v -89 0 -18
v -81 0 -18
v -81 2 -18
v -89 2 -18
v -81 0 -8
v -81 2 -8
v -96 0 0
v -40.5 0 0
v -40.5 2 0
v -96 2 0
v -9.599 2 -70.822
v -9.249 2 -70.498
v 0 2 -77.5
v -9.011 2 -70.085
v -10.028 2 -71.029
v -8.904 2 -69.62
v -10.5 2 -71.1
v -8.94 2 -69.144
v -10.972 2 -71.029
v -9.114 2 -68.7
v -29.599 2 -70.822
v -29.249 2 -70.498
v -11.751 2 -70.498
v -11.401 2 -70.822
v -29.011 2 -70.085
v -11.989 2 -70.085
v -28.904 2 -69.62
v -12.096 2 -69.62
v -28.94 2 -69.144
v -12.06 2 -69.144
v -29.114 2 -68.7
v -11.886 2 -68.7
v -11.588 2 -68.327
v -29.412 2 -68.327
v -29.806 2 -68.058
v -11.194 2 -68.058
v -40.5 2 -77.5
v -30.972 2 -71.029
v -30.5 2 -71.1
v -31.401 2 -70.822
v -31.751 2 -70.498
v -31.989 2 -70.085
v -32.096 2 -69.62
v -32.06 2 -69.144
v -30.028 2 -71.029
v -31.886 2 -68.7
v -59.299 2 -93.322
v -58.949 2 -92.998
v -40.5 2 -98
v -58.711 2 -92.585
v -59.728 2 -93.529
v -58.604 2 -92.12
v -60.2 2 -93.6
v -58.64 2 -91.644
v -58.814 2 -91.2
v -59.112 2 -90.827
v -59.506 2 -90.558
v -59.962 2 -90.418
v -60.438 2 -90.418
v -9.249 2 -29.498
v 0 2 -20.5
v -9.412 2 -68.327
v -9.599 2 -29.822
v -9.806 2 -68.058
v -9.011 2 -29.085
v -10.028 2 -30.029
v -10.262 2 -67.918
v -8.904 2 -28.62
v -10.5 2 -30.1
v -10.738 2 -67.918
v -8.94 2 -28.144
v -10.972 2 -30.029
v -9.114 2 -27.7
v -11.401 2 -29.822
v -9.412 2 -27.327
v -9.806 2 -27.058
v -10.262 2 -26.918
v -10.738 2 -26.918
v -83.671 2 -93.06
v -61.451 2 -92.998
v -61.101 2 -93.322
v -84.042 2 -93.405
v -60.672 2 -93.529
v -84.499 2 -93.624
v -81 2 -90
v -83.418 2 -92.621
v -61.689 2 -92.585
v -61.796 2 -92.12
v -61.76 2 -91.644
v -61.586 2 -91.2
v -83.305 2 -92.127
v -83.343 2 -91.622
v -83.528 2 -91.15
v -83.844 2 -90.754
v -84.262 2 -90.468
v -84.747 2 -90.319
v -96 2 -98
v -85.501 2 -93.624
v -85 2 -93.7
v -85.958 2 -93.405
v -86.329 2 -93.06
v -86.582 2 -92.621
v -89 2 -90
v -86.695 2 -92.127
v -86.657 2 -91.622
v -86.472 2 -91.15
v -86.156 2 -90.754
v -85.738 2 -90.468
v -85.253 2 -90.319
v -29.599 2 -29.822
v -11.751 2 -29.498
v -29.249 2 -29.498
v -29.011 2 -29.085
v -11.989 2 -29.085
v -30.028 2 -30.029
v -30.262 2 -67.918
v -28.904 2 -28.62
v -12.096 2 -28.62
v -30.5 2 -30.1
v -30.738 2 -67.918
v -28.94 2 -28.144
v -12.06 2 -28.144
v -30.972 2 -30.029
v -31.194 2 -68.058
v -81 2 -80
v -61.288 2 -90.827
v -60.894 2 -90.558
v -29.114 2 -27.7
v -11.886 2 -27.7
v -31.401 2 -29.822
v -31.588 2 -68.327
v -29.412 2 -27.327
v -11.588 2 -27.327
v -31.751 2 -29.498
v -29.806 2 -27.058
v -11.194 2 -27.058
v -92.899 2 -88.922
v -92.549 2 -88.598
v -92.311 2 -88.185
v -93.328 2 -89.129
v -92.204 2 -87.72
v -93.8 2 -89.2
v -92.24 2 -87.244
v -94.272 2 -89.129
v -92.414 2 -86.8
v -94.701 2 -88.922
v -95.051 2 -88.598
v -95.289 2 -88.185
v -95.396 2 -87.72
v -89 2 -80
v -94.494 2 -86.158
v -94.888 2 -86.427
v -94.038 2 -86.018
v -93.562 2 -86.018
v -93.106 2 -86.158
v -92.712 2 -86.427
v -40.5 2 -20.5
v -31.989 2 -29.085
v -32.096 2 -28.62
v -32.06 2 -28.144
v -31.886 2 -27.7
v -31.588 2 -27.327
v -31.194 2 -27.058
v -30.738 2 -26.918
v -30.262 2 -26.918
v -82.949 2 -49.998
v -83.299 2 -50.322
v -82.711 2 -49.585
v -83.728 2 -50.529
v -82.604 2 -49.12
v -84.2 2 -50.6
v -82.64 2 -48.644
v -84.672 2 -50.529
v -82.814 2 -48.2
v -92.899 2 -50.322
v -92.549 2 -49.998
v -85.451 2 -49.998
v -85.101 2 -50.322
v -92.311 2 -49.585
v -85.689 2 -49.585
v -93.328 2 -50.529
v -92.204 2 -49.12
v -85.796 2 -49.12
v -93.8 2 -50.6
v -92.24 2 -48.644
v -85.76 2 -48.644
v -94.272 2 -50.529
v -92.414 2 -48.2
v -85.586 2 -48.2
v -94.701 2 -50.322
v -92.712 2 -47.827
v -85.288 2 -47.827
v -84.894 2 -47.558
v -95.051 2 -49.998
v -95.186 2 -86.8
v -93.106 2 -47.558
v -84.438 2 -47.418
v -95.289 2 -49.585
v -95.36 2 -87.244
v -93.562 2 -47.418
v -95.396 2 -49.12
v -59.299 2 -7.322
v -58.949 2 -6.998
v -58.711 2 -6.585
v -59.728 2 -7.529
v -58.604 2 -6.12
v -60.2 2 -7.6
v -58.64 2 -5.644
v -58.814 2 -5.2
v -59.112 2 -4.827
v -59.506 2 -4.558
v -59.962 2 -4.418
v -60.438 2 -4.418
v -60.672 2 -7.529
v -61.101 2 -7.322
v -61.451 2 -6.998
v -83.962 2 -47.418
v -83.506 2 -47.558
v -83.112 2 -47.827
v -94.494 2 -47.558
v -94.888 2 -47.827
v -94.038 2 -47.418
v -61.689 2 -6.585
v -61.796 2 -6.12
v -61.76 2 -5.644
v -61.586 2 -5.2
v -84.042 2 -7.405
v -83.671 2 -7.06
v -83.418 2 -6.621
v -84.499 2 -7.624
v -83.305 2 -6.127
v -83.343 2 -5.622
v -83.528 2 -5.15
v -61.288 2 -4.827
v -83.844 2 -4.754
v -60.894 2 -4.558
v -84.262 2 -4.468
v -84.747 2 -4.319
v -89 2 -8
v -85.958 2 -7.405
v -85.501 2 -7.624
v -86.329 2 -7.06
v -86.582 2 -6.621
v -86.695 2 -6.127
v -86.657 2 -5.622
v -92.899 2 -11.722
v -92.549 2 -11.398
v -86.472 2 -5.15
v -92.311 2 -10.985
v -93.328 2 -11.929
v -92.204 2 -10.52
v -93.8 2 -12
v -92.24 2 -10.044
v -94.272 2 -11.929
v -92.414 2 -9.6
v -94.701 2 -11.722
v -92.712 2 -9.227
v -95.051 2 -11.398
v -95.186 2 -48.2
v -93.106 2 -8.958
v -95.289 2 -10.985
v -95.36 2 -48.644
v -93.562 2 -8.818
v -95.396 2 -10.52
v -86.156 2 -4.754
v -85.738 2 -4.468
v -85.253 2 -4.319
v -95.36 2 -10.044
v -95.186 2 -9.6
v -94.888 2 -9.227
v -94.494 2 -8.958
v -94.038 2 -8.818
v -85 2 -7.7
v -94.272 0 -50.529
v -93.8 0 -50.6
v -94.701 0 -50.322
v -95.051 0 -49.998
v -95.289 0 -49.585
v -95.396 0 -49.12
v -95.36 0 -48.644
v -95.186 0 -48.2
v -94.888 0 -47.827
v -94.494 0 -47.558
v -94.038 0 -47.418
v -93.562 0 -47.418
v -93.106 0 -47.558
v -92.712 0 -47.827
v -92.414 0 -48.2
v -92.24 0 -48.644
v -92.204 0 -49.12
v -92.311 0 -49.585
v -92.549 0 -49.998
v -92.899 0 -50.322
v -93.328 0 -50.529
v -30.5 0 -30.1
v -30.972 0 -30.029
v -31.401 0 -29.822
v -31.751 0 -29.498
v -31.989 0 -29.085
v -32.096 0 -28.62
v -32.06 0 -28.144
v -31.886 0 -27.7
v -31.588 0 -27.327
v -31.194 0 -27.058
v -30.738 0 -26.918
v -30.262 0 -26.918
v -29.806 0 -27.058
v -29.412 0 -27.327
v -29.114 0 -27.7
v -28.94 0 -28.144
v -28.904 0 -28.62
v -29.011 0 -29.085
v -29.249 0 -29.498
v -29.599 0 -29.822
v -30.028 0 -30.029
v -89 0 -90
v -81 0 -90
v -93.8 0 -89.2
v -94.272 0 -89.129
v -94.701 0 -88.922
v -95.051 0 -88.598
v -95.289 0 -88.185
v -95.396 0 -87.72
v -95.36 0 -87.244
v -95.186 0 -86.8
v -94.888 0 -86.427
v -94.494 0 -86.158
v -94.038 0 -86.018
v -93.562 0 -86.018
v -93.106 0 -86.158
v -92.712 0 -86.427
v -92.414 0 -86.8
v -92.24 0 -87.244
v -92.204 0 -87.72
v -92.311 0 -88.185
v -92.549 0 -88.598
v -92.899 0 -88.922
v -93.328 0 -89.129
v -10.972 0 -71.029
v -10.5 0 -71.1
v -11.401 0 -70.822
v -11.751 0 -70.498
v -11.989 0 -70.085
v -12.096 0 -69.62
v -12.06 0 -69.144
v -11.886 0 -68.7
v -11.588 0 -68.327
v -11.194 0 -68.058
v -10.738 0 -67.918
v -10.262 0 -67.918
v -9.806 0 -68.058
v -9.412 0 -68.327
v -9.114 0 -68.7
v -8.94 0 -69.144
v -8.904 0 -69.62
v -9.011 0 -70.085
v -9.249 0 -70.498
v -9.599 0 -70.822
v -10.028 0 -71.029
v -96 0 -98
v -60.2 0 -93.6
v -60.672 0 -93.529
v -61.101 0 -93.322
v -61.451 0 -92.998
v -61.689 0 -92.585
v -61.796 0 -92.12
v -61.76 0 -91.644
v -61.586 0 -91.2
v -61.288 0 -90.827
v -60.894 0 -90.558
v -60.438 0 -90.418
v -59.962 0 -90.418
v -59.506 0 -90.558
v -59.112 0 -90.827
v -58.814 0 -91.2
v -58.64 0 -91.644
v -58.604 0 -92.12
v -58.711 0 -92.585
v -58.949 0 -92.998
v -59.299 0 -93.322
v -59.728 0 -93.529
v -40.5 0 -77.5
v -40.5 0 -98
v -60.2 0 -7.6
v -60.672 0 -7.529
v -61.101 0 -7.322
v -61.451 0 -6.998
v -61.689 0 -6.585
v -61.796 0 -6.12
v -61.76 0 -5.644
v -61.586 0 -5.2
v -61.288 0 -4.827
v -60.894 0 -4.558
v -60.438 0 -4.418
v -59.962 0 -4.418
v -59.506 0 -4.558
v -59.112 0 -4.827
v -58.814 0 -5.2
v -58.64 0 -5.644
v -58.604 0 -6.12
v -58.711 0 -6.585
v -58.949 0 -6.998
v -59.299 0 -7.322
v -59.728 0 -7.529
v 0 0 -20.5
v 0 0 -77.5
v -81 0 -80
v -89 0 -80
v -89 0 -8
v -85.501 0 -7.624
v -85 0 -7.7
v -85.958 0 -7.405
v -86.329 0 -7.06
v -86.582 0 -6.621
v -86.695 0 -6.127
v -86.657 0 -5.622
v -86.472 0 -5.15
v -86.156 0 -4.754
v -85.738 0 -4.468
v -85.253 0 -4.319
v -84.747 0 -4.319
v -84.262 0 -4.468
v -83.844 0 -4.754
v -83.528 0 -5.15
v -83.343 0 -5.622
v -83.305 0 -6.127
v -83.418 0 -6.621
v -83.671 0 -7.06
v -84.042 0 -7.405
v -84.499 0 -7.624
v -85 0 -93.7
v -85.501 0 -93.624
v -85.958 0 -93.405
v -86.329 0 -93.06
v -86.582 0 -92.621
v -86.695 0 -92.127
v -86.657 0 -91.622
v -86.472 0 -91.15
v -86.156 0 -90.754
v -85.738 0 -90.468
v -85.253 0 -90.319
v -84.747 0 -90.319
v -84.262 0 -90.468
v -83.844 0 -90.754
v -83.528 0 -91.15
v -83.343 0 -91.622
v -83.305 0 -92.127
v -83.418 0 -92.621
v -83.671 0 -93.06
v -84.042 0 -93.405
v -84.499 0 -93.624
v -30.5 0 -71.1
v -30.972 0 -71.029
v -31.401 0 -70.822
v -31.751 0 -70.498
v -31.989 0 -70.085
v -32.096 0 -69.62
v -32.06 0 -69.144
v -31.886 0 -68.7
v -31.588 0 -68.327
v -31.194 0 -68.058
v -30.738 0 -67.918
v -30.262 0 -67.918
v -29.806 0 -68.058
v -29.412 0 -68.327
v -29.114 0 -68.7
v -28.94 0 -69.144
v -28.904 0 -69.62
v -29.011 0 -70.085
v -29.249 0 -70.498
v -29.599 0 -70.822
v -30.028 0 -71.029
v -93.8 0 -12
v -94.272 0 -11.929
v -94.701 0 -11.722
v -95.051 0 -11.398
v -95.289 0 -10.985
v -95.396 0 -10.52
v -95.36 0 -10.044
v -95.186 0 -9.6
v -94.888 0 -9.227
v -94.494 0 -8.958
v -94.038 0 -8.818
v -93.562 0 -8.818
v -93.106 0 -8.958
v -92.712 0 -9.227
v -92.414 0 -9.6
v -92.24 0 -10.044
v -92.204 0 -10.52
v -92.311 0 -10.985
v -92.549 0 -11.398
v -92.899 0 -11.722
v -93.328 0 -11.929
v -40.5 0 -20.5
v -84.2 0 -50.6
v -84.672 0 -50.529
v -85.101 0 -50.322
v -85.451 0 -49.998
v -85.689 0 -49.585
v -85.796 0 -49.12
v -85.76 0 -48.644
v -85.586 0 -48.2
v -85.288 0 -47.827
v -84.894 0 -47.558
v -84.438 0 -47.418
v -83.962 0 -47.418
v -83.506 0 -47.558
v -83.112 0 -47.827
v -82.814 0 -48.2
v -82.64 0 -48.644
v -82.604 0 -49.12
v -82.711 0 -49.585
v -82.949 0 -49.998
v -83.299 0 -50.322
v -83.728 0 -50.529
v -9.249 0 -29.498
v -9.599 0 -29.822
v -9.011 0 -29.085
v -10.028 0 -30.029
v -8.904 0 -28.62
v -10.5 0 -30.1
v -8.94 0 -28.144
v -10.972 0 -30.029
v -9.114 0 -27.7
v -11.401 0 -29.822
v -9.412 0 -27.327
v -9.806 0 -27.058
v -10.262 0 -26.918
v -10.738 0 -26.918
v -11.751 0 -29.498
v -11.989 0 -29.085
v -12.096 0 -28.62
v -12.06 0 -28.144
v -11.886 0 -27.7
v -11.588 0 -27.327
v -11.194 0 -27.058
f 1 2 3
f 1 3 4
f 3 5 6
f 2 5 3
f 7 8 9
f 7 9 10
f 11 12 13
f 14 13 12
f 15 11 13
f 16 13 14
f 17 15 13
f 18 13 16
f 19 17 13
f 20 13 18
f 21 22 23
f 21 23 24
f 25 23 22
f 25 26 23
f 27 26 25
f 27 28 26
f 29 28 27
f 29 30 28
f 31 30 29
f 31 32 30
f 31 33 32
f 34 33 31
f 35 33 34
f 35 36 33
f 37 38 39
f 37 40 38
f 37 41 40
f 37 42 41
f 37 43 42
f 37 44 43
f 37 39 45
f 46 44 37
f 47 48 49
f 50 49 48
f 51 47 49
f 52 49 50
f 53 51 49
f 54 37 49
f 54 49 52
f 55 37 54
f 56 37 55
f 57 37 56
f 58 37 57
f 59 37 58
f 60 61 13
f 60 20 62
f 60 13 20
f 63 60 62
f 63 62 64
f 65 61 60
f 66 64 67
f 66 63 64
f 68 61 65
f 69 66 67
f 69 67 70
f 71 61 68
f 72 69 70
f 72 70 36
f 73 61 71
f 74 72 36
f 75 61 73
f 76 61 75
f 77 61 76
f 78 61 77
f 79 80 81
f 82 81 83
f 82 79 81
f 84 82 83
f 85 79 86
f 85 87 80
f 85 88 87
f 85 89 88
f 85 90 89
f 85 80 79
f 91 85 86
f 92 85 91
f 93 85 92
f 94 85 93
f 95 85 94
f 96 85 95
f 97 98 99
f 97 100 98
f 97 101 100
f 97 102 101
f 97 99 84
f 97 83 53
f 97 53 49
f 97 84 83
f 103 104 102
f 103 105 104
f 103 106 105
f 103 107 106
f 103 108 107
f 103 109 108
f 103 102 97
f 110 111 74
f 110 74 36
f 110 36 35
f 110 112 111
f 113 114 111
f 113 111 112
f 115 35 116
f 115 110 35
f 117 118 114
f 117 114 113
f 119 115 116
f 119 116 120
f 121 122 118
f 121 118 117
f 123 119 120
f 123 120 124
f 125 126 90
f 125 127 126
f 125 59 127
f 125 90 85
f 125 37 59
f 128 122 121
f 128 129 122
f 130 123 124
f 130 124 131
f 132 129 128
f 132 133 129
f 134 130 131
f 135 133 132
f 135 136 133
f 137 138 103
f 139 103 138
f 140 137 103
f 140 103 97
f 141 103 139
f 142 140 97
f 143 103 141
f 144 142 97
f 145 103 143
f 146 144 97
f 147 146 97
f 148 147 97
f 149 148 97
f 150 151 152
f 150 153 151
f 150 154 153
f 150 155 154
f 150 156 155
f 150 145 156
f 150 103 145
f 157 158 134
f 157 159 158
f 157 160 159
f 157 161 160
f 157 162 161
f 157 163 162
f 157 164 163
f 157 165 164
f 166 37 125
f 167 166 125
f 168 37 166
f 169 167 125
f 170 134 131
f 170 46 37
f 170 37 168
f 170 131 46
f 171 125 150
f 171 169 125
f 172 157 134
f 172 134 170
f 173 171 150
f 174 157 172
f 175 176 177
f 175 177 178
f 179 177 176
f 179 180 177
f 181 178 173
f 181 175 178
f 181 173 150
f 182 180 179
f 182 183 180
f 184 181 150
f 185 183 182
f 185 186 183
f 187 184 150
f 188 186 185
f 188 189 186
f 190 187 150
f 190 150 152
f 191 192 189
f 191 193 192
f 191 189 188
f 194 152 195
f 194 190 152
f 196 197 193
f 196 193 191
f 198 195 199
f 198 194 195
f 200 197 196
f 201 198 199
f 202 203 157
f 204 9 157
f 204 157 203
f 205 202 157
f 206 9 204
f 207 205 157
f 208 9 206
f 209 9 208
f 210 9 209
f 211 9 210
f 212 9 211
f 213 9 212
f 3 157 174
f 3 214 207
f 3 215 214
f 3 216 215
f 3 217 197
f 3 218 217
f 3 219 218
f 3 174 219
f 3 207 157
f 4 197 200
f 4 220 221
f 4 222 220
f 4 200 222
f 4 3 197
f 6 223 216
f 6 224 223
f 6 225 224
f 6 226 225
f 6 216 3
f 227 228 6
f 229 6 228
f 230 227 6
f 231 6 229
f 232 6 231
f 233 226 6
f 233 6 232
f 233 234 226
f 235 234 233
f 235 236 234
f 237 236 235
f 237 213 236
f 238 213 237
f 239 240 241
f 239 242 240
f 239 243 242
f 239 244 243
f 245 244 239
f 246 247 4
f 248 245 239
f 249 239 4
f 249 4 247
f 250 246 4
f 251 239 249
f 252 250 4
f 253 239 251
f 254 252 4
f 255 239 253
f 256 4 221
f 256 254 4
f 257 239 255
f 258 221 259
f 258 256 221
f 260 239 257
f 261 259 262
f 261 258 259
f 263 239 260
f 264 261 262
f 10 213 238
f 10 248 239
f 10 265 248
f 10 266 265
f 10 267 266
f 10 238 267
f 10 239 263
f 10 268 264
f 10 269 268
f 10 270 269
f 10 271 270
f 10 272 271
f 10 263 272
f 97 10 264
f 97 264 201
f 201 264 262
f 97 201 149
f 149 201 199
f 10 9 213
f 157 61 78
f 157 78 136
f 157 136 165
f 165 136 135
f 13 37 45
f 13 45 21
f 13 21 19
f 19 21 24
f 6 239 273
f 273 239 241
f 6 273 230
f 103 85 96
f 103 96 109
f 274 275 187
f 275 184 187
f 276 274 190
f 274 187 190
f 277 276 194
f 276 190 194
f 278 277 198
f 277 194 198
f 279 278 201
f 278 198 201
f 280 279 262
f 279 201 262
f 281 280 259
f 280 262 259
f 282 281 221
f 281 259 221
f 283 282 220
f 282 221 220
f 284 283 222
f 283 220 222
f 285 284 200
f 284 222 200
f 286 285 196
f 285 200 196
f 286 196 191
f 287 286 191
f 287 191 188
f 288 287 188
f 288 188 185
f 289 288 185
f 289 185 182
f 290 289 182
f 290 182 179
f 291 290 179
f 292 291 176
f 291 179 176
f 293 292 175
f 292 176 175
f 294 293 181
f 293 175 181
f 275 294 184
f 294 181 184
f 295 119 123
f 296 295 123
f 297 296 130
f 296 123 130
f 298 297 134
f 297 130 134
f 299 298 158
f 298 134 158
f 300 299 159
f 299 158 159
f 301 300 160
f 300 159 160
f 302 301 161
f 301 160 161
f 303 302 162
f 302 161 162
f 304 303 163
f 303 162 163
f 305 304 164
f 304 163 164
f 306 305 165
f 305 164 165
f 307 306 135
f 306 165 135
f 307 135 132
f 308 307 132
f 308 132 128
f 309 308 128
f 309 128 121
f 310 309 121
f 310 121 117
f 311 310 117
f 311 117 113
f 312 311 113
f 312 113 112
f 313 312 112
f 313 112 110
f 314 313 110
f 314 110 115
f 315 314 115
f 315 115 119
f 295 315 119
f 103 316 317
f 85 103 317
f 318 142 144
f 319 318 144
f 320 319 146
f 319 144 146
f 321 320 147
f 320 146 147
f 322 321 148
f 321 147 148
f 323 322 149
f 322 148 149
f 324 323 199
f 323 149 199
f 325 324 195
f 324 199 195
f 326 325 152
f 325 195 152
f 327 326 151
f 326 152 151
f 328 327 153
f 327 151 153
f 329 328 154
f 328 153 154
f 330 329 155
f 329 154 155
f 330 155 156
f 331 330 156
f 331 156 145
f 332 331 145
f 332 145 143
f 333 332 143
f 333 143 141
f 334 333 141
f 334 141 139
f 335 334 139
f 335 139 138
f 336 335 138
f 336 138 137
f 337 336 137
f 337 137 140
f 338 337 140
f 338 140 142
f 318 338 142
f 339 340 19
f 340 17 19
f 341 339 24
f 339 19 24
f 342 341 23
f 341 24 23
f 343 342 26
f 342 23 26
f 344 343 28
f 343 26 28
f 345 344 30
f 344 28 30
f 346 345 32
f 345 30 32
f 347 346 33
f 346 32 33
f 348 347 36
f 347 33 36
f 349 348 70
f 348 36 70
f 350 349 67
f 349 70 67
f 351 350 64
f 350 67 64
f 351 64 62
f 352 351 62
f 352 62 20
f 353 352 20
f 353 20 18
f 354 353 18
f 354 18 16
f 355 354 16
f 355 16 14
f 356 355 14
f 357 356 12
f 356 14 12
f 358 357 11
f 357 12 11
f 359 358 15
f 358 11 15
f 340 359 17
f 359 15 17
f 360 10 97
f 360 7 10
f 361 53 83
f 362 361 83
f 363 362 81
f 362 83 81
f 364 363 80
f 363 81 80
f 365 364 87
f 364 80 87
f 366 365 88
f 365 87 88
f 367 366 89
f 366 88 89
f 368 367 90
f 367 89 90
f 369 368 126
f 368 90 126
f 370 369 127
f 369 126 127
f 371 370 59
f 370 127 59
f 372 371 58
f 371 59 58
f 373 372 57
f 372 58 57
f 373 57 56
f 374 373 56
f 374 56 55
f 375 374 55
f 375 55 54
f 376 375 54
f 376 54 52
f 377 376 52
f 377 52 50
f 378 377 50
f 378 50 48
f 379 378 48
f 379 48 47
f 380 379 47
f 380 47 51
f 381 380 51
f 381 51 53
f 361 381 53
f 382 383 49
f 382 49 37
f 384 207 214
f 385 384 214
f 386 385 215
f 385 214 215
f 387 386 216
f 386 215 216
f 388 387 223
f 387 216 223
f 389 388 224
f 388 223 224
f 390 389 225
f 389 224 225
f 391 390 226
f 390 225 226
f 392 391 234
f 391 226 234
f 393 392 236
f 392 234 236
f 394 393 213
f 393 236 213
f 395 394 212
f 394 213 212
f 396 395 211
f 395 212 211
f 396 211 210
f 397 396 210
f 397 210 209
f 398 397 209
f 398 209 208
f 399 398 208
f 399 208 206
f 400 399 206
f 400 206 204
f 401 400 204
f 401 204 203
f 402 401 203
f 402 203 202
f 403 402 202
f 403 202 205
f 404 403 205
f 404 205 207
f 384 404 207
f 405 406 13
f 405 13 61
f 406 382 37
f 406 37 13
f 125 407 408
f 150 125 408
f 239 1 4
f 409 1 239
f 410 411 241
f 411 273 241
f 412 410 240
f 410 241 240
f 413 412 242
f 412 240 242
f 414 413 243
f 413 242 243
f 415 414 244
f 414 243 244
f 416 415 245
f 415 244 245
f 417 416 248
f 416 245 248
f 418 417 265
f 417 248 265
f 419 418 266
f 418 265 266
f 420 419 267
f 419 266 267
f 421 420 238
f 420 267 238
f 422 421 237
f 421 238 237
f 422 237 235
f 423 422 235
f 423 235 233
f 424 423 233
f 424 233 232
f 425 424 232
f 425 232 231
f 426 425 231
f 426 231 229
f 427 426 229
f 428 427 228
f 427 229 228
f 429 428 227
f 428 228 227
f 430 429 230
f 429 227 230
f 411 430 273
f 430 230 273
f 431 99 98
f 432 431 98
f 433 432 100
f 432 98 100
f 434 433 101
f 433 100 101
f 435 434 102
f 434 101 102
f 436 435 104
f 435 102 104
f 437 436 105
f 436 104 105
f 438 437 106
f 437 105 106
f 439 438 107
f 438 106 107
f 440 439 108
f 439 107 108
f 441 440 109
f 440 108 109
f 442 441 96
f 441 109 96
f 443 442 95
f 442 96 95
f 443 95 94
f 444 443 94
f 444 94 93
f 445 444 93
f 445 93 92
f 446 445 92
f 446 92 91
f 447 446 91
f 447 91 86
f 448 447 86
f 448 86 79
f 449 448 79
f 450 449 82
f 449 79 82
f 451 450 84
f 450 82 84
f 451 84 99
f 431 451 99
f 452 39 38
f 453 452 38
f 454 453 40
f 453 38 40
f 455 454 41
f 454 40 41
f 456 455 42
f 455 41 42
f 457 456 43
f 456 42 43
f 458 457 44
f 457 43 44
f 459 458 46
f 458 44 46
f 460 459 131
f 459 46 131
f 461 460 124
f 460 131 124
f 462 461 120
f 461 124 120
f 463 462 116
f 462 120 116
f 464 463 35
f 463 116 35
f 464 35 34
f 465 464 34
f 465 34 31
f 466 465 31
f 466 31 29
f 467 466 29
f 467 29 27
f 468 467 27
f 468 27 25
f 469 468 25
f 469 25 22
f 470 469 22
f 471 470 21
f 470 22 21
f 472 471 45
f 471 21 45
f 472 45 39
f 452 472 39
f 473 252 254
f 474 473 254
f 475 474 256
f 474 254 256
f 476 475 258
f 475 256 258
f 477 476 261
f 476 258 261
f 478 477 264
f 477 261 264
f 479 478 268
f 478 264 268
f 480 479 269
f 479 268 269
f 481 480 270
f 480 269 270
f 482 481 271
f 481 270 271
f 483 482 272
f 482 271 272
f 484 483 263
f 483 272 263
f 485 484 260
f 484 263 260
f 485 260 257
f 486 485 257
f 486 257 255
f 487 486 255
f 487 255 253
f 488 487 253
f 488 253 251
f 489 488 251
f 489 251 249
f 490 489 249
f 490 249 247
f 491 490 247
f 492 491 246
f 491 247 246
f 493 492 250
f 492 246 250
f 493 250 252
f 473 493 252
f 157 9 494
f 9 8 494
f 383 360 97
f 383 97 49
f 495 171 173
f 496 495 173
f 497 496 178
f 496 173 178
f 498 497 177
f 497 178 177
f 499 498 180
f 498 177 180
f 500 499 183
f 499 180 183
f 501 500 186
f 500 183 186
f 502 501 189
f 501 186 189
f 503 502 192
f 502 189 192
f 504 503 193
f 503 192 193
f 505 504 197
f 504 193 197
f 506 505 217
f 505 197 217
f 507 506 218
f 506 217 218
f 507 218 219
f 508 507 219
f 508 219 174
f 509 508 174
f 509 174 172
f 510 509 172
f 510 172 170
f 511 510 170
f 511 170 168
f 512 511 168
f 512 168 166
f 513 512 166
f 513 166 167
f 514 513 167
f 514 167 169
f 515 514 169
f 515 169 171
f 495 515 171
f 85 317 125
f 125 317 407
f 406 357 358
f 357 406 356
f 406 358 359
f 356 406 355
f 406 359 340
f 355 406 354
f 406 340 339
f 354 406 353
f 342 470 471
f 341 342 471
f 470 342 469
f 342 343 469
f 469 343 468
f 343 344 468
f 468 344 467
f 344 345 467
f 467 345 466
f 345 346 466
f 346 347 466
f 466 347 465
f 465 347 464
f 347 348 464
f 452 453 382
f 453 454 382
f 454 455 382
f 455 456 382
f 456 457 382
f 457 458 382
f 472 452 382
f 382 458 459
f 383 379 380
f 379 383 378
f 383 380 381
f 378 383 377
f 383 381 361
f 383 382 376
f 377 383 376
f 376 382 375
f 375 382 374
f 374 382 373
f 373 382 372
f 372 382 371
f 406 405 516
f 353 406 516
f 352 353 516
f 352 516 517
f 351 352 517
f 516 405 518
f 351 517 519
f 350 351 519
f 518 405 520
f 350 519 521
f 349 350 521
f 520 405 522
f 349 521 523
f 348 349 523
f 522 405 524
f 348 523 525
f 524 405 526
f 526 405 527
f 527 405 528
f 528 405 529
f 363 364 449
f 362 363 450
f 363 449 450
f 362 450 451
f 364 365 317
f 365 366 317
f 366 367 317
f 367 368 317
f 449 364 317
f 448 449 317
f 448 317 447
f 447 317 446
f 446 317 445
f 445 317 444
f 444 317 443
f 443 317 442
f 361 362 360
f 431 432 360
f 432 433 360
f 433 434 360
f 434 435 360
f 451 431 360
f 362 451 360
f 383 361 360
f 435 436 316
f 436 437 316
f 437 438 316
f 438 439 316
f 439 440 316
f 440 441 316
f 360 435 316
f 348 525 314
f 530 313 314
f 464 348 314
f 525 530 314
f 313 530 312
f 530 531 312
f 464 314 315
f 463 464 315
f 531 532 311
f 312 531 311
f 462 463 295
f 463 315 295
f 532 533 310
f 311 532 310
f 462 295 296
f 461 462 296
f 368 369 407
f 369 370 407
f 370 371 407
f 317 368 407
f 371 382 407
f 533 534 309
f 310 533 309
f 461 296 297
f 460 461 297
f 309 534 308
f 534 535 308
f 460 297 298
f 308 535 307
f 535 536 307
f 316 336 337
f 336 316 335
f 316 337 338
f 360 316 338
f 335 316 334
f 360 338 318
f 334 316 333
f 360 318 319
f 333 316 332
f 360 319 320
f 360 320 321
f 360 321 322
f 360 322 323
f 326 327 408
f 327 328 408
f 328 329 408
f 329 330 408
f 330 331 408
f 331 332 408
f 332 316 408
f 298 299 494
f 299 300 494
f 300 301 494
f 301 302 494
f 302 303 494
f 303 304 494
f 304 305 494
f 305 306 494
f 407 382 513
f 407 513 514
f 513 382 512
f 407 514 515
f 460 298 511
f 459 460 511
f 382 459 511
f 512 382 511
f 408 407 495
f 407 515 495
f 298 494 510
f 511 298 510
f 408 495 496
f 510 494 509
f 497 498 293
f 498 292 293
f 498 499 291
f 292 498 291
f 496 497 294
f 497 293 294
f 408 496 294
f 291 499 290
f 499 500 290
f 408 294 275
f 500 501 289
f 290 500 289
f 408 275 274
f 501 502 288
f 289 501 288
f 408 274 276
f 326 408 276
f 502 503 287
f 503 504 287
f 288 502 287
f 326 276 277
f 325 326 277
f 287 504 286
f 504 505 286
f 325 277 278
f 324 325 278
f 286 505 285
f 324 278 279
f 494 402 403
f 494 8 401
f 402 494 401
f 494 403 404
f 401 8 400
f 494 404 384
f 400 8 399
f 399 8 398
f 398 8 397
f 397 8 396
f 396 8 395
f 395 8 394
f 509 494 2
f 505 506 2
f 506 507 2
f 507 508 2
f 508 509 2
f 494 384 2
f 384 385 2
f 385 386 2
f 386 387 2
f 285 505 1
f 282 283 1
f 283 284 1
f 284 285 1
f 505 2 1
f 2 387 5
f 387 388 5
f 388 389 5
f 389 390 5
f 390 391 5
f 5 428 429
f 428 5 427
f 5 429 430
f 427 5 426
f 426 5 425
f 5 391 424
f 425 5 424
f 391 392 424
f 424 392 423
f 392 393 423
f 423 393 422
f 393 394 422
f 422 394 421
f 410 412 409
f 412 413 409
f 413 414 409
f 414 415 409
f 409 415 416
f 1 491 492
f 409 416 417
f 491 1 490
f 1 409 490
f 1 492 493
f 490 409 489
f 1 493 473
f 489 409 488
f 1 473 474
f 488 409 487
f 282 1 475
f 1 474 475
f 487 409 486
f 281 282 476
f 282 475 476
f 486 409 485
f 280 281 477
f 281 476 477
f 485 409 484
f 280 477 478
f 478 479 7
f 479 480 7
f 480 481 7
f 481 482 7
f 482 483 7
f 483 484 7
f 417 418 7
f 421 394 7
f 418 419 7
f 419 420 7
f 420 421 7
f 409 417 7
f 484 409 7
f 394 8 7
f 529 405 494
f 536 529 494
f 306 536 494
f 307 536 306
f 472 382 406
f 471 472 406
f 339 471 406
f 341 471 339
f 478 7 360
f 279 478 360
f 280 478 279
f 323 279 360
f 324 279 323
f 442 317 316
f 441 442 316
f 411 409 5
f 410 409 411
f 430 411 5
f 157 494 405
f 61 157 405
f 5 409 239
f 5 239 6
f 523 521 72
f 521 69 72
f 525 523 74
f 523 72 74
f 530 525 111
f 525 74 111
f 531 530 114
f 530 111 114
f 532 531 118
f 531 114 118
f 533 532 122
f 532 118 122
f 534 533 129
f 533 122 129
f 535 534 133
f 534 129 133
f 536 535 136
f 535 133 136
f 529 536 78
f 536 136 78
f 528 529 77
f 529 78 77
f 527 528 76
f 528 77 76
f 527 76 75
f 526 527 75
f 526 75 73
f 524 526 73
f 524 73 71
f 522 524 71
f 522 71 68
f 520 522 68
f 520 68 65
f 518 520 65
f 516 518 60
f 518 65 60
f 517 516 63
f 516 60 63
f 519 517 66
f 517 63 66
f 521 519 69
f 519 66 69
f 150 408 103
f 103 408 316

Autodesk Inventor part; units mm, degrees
ref_plane "YZ Plane" through (0, 0, 0) normal (1, 0, 0) x (0, 1, 0)
ref_plane "XZ Plane" through (0, 0, 0) normal (0, 1, 0) x (-1, 0, 0)
ref_plane "XY Plane" through (0, 0, 0) normal (0, 0, 1) x (1, 0, 0)
sketch "Szkic1" plane through (0, 0, 0) normal (0, 1, 0) x (-1, 0, 0)
  line L0 (40.5, 0) -> (96, 0)
  line L1 (96, 0) -> (96, -98)
  line L2 (96, -98) -> (40.5, -98)
  line L3 (0, -77.5) -> (0, -20.5)
  line L4 (40.5, 0) -> (40.5, -20.5)
  line L5 (40.5, -20.5) -> (0, -20.5)
  line L6 (40.5, -98) -> (40.5, -77.5)
  line L7 (40.5, -77.5) -> (0, -77.5)
  line L8 (0, -49) -> (96, -49) construction
  line L9 (10.5, -77.5) -> (10.5, -20.5) construction
  line L10 (30.5, -77.5) -> (30.5, -20.5) construction
  line L11 (93.8, 0) -> (93.8, -98) construction
  line L12 (96, -6) -> (40.5, -6) construction
  line L13 (96, -92) -> (40.5, -92) construction
  line L14 (84.2, 0) -> (84.2, -98) construction
  line L15 (85, 0) -> (85, -98) construction
  line L16 (89, -8) -> (81, -8)
  line L17 (81, -8) -> (81, -18)
  line L18 (81, -18) -> (89, -18)
  line L19 (89, -18) -> (89, -8)
  line L20 (89, -90) -> (81, -90)
  line L21 (81, -90) -> (81, -80)
  line L22 (81, -80) -> (89, -80)
  line L23 (89, -80) -> (89, -90)
  point P0 (0, 0)
  point P1 (30.5, -28.5)
  point P2 (30.5, -69.5)
  point P3 (10.5, -28.5)
  point P4 (10.5, -69.5)
  point P5 (93.8, -10.4)
  point P6 (93.8, -87.6)
  point P7 (93.8, -49)
  point P8 (60.2, -6)
  point P9 (60.2, -92)
  point P10 (84.2, -49)
  point P11 (85, -6)
  point P12 (85, -92)
  dimension "d0" = 98
  dimension "d2" = 20.5
  dimension "d3" = 40.5
  dimension "d12" = 96
  dimension "d42" = 57
  dimension "d71" = 10.4
  dimension "d72" = 6
  dimension "d73" = 2.2
  dimension "d81" = 35.8
  dimension "d89" = 30.5
  dimension "d90" = 8
  dimension "d91" = 8
  dimension "d92" = 8
  dimension "d93" = 11.8
  dimension "d94" = 11
  dimension "d95" = 10.5
  dimension "d96" = 6
  dimension "d97" = 0
  dimension "d98" = 96
  dimension "d106" = 8
  dimension "d107" = 10
  dimension "d108" = 7
  dimension "d109" = 8
extrude "Wyciągnięcie proste1" add sketch "Szkic1" along normal blind 2 contours L0 L1 L2 L6 L7 L3 L5 L4 | L19 L18 L17 L16 | L20 L21 L22 L23
hole "Hole4" at (-30.5, 0, -28.5) at (-30.5, 0, -69.5) at (-10.5, 0, -28.5) at (-10.5, 0, -69.5) direction (0, 1, 0) diameter 3.2 depth 10
hole "Otwór5" at (-93.8, 0, -10.4) at (-93.8, 0, -87.6) at (-93.8, 0, -49) direction (0, 1, 0) diameter 3.2 end through all clearance for "Śruba ze łbem stożkowym ISO 2009/7046" size "M3" standard "ISO"
hole "Hole6" at (-60.2, 0, -6) at (-60.2, 0, -92) direction (0, 1, 0) diameter 3.2 depth 30 clearance for "Countersunk Flat Head Screw ISO 2009/7046" size "M3" standard "ISO"
hole "Hole7" at (-84.2, 0, -49) direction (0, 1, 0) diameter 3.2 depth 30 clearance for "Slotted Cheese Head Screw ISO 1207" size "M3" standard "ISO"
hole "Hole8" at (-85, 0, -6) at (-85, 0, -92) direction (0, 1, 0) diameter 3.4 end through all clearance for "Countersunk Flat Head Screw ISO 2009/7046" size "M3" standard "ISO"
extrude "Extrusion2" cut sketch "Szkic1" along normal blind 10 contours L19 L18 L17 L16 | L20 L21 L22 L23
properties part number "PodstawaPEM"
